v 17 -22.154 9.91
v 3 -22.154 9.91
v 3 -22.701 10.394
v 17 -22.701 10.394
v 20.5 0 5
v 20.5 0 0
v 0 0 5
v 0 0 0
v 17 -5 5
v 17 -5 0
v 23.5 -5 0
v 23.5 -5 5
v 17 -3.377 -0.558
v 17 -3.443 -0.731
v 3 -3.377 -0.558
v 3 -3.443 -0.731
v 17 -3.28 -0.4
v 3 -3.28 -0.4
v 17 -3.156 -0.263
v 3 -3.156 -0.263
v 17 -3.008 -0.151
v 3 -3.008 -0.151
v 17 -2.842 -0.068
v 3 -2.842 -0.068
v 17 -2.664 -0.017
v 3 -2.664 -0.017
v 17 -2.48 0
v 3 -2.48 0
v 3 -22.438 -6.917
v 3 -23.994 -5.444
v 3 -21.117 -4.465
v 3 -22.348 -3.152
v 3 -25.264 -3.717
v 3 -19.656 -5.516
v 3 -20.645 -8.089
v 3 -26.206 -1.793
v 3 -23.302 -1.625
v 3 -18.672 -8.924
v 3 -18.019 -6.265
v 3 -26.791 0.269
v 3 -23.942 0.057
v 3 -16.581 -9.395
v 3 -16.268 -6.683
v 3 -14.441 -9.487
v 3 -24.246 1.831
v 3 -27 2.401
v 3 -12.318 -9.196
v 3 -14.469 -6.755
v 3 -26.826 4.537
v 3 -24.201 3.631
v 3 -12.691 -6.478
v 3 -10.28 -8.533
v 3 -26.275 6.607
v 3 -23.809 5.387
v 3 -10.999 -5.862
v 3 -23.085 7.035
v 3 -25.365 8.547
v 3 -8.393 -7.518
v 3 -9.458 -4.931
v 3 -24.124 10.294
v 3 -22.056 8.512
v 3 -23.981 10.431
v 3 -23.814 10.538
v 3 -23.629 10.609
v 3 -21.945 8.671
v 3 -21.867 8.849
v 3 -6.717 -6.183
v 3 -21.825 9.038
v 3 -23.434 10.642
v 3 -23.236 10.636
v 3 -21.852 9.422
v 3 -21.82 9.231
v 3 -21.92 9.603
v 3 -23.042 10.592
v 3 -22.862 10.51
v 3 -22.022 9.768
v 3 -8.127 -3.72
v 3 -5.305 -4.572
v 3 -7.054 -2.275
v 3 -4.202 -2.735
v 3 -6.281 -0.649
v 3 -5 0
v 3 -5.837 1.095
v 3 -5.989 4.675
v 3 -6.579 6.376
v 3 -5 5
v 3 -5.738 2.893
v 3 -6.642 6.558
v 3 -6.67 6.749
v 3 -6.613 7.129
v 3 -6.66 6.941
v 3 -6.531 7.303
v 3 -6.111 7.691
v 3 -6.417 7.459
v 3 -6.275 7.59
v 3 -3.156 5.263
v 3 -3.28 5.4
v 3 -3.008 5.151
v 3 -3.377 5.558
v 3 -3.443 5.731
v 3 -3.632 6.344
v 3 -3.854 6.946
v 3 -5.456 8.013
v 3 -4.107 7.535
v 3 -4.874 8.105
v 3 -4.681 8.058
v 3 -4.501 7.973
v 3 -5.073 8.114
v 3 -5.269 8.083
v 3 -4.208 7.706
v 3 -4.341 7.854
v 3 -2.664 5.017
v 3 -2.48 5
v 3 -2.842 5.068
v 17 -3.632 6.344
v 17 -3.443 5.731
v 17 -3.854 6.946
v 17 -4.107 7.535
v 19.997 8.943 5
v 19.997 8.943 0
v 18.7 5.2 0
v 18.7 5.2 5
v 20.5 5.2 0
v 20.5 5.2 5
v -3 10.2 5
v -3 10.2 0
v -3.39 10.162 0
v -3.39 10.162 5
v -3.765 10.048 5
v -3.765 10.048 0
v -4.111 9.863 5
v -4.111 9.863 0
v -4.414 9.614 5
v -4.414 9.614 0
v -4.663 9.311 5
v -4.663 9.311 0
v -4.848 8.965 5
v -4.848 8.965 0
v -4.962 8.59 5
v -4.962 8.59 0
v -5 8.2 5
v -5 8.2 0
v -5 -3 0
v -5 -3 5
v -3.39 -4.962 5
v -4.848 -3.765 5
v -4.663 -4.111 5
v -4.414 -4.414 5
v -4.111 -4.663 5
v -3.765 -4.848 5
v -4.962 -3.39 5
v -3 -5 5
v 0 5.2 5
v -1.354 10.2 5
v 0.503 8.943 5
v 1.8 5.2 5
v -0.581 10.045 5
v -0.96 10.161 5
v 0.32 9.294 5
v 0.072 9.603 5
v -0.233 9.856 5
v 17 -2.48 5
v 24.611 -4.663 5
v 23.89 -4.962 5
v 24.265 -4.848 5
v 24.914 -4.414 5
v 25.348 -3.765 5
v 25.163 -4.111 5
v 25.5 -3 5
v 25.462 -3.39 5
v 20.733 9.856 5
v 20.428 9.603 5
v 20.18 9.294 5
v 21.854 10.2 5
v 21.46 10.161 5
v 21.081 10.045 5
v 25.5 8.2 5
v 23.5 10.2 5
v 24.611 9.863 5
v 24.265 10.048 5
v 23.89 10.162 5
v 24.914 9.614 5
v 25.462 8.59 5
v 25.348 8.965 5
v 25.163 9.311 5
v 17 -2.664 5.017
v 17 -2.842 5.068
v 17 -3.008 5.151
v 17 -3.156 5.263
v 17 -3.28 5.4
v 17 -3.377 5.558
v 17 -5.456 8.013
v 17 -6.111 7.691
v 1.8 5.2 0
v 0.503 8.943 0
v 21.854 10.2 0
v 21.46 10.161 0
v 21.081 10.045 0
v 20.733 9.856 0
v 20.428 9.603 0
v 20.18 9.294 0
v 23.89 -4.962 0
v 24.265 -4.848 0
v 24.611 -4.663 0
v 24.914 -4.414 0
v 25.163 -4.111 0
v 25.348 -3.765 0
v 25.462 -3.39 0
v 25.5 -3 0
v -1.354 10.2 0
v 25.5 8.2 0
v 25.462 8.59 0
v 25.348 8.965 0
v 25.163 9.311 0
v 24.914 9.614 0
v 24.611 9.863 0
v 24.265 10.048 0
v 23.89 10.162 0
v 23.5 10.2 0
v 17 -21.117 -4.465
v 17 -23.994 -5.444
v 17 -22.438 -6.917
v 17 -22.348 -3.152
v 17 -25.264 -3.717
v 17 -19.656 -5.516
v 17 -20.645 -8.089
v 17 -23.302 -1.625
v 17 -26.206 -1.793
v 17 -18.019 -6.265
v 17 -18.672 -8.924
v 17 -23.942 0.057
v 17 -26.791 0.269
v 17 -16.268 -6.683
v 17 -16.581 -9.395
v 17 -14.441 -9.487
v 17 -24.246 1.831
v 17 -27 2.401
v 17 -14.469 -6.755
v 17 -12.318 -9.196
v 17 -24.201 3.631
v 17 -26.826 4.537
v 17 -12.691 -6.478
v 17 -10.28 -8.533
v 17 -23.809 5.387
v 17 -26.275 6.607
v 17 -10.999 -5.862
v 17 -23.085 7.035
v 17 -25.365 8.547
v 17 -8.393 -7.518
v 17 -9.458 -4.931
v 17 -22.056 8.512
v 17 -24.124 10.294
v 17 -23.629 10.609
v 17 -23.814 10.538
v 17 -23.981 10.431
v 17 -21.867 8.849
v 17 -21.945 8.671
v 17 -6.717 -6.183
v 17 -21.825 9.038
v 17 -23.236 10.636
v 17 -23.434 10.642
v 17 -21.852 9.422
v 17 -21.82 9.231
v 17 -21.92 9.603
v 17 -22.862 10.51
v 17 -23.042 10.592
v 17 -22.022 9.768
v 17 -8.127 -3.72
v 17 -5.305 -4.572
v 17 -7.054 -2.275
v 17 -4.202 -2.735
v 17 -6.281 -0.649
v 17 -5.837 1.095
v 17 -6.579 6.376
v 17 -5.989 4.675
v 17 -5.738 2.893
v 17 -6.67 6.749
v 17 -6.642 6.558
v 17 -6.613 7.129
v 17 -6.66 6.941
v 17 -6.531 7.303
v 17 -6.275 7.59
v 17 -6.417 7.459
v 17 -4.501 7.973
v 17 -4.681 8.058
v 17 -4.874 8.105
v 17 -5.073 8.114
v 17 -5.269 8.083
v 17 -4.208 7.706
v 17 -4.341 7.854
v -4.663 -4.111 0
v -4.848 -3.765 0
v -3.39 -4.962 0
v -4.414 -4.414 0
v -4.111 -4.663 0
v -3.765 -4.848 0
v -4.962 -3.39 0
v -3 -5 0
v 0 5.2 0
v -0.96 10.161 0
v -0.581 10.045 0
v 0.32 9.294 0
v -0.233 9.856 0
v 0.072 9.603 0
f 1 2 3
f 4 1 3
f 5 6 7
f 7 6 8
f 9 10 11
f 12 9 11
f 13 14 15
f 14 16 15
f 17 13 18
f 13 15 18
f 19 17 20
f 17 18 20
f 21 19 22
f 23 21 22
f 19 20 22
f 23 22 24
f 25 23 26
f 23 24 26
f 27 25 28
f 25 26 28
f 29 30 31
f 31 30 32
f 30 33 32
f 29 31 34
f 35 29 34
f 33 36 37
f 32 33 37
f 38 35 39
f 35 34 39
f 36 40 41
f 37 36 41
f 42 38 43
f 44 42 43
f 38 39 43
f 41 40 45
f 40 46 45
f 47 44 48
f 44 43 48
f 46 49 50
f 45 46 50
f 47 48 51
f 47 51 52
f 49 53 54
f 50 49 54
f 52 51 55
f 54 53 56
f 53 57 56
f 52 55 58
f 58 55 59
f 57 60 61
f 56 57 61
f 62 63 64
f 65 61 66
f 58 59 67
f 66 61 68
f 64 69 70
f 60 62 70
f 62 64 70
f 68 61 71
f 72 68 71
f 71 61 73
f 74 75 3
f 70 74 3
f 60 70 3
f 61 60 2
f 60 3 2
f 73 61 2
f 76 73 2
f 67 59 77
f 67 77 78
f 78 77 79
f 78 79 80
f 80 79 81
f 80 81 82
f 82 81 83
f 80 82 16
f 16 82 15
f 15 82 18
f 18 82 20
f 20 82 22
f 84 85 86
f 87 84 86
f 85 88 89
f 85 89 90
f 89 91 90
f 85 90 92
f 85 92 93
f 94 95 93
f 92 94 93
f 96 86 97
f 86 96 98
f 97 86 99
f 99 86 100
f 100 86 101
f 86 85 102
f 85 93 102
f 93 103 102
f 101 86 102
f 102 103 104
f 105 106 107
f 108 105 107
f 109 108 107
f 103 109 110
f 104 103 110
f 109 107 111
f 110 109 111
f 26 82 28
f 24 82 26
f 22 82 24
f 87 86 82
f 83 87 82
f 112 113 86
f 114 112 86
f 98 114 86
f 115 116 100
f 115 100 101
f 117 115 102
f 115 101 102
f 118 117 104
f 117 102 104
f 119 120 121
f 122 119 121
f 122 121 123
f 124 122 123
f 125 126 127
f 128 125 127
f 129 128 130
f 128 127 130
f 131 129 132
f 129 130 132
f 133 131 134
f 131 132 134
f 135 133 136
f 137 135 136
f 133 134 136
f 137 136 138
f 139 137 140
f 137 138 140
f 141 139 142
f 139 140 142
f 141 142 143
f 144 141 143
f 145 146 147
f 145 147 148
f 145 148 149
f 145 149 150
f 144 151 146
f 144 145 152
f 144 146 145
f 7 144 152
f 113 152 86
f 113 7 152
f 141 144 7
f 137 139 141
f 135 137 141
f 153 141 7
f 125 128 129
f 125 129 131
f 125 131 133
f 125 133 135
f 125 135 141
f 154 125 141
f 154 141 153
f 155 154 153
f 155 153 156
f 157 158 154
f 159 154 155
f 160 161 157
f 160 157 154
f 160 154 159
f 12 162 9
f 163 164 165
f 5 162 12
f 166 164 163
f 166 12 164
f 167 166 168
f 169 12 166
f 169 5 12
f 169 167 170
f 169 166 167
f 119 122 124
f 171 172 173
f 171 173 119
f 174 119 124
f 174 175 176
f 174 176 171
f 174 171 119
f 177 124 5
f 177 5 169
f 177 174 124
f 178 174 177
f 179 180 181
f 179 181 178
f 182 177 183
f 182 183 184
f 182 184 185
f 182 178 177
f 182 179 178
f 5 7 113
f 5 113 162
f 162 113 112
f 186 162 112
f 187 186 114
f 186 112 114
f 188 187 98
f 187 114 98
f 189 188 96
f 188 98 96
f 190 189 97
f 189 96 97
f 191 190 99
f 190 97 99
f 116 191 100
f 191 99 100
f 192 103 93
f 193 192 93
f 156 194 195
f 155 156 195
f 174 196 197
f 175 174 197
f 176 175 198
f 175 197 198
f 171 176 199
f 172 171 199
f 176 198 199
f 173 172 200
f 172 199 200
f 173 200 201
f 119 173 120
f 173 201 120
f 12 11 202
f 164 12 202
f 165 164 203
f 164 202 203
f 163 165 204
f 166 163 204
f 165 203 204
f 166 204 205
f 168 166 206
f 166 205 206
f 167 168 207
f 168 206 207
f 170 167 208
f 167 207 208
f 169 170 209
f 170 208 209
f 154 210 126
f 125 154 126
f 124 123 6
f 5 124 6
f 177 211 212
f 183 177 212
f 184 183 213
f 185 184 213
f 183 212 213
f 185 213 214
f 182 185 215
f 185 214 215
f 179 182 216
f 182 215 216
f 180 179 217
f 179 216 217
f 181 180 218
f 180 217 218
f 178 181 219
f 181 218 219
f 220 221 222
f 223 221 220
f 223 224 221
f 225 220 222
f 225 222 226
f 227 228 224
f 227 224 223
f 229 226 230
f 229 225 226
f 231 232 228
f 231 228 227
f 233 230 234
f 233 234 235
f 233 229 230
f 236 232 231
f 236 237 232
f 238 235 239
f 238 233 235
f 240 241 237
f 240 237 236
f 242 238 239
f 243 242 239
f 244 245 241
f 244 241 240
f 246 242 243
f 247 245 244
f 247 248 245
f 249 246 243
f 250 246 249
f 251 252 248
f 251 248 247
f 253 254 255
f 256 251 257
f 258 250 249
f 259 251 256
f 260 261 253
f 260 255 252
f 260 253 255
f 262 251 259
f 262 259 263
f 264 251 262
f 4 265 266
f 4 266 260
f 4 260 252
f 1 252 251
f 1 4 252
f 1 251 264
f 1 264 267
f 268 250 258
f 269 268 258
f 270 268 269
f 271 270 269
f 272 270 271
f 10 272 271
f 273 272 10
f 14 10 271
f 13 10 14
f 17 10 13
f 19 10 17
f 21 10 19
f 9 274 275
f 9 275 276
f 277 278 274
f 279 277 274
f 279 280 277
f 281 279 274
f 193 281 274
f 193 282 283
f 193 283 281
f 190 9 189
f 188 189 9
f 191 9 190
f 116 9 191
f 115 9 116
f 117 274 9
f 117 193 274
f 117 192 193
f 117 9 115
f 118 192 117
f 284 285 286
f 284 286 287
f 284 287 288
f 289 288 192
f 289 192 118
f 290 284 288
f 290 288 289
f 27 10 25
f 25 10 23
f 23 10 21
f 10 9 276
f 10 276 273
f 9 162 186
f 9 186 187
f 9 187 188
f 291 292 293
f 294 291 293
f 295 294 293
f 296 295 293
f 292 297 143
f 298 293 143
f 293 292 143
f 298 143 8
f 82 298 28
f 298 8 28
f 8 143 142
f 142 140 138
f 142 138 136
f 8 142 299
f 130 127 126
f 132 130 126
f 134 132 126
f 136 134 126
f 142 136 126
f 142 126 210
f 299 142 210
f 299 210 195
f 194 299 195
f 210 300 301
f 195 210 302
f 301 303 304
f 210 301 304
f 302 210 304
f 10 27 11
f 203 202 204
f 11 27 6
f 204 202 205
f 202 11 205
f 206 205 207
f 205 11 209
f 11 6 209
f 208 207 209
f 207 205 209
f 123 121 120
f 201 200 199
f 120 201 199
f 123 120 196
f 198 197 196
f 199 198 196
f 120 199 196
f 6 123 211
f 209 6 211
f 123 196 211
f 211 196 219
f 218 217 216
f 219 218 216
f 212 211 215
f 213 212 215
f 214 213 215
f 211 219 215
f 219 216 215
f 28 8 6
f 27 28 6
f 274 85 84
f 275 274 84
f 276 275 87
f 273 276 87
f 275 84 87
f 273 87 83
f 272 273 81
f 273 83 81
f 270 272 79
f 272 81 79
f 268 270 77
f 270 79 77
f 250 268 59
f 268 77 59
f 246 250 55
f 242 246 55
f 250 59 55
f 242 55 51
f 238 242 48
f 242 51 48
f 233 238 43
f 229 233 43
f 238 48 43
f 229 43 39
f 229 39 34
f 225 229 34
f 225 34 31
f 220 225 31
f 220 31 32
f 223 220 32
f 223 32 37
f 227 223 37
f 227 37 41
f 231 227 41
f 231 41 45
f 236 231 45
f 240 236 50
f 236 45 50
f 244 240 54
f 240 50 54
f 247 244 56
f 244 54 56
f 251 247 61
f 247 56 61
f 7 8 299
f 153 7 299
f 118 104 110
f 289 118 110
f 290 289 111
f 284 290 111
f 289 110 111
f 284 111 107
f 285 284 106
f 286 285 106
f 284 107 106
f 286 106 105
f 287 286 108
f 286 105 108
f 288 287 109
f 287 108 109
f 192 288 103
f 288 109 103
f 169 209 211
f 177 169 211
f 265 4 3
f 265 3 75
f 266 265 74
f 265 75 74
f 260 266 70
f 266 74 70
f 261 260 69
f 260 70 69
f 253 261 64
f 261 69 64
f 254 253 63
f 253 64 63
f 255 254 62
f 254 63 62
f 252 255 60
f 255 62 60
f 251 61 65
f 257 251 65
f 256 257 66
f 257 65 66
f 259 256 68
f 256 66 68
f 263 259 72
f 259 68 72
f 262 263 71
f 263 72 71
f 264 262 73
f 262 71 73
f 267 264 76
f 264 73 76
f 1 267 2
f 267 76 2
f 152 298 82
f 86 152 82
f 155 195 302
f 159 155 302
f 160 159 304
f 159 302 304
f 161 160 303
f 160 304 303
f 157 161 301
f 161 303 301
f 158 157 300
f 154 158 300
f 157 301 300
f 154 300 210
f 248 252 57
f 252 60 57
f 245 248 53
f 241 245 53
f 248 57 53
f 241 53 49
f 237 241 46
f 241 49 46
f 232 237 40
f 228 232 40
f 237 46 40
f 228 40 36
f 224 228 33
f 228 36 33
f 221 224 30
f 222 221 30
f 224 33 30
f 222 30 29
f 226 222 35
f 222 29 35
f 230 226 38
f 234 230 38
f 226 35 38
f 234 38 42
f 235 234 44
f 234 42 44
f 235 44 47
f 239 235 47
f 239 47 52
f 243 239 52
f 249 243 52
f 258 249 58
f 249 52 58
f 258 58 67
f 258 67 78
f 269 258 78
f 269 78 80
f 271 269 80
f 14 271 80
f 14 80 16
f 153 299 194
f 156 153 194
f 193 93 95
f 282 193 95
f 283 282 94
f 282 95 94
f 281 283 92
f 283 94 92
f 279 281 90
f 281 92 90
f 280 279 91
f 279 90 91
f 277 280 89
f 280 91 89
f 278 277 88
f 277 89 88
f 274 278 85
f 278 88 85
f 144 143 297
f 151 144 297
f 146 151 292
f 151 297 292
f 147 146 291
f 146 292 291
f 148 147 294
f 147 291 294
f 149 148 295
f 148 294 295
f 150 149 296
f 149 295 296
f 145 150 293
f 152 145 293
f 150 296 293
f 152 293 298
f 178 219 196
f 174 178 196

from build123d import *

# Parameters (mm, degrees)
F1_DEPTH = 5
F5_DEPTH = 7
F6_DEPTH = 7


with BuildPart() as f1:
    # F0 (on Top) → F1 (new body)
    with BuildSketch(Plane.XY):
        with BuildLine():
            Line((20.5, 0), (0, 0))
            Line((0, 0), (0, 5.2))
            Line((0, 5.2), (1.8, 5.2))
            Line((1.8, 5.2), (0.502887, 8.942781))
            ThreePointArc((0.502887, 8.942781), (-0.232808, 9.856134), (-1.354066, 10.2))
            Line((-1.354066, 10.2), (-3, 10.2))
            ThreePointArc((-3, 10.2), (-4.414214, 9.614214), (-5, 8.2))
            Line((-5, 8.2), (-5, -3))
            ThreePointArc((-5, -3), (-4.414214, -4.414214), (-3, -5))
            Line((-3, -5), (23.5, -5))
            ThreePointArc((23.5, -5), (24.914214, -4.414214), (25.5, -3))
            Line((25.5, -3), (25.5, 0))
            Line((25.5, 0), (25.5, 8.2))
            ThreePointArc((25.5, 8.2), (24.914214, 9.614214), (23.5, 10.2))
            Line((23.5, 10.2), (21.854066, 10.2))
            ThreePointArc((21.854066, 10.2), (20.732808, 9.856134), (19.997113, 8.942781))
            Line((19.997113, 8.942781), (18.7, 5.2))
            Line((18.7, 5.2), (20.5, 5.2))
            Line((20.5, 5.2), (20.5, 0))
        make_face()
    extrude(amount=F1_DEPTH)

    # F4 (on offset) → F5 (join)
    with BuildSketch(Plane.YZ.offset(10)):
        with BuildLine():
            ThreePointArc((-22.701302, 10.393598), (-23.433626, 10.642174), (-24.124238, 10.294118))
            ThreePointArc((-24.124238, 10.294118), (-20.645043, -8.08931), (-3.443092, -0.730769))
            ThreePointArc((-3.443092, -0.730769), (-3.084486, -0.203372), (-2.480016, 0))
            Line((-2.480016, 0), (0, 0))
            Line((0, 0), (0, 5))
            Line((0, 5), (-2.480016, 5))
            ThreePointArc((-2.480016, 5), (-3.084486, 5.203372), (-3.443092, 5.730769))
            ThreePointArc((-3.443092, 5.730769), (-3.739036, 6.646167), (-4.107359, 7.534916))
            ThreePointArc((-4.107359, 7.534916), (-4.680832, 8.057825), (-5.455624, 8.01307))
            Line((-5.455624, 8.01307), (-6.111157, 7.691379))
            ThreePointArc((-6.111157, 7.691379), (-6.612821, 7.128674), (-6.579024, 6.375572))
            ThreePointArc((-6.579024, 6.375572), (-16.267771, -6.6829), (-22.055883, 8.512273))
            ThreePointArc((-22.055883, 8.512273), (-21.819513, 9.231201), (-22.154452, 9.909835))
            Line((-22.154452, 9.909835), (-22.701302, 10.393598))
        make_face()
    extrude(amount=-F5_DEPTH)

    # F4 (on offset) → F6 (join)
    with BuildSketch(Plane.YZ.offset(10)):
        with BuildLine():
            ThreePointArc((-22.701302, 10.393598), (-23.433626, 10.642174), (-24.124238, 10.294118))
            ThreePointArc((-24.124238, 10.294118), (-20.645043, -8.08931), (-3.443092, -0.730769))
            ThreePointArc((-3.443092, -0.730769), (-3.084486, -0.203372), (-2.480016, 0))
            Line((-2.480016, 0), (0, 0))
            Line((0, 0), (0, 5))
            Line((0, 5), (-2.480016, 5))
            ThreePointArc((-2.480016, 5), (-3.084486, 5.203372), (-3.443092, 5.730769))
            ThreePointArc((-3.443092, 5.730769), (-3.739036, 6.646167), (-4.107359, 7.534916))
            ThreePointArc((-4.107359, 7.534916), (-4.680832, 8.057825), (-5.455624, 8.01307))
            Line((-5.455624, 8.01307), (-6.111157, 7.691379))
            ThreePointArc((-6.111157, 7.691379), (-6.612821, 7.128674), (-6.579024, 6.375572))
            ThreePointArc((-6.579024, 6.375572), (-16.267771, -6.6829), (-22.055883, 8.512273))
            ThreePointArc((-22.055883, 8.512273), (-21.819513, 9.231201), (-22.154452, 9.909835))
            Line((-22.154452, 9.909835), (-22.701302, 10.393598))
        make_face()
    extrude(amount=F6_DEPTH)


solid = f1.part
